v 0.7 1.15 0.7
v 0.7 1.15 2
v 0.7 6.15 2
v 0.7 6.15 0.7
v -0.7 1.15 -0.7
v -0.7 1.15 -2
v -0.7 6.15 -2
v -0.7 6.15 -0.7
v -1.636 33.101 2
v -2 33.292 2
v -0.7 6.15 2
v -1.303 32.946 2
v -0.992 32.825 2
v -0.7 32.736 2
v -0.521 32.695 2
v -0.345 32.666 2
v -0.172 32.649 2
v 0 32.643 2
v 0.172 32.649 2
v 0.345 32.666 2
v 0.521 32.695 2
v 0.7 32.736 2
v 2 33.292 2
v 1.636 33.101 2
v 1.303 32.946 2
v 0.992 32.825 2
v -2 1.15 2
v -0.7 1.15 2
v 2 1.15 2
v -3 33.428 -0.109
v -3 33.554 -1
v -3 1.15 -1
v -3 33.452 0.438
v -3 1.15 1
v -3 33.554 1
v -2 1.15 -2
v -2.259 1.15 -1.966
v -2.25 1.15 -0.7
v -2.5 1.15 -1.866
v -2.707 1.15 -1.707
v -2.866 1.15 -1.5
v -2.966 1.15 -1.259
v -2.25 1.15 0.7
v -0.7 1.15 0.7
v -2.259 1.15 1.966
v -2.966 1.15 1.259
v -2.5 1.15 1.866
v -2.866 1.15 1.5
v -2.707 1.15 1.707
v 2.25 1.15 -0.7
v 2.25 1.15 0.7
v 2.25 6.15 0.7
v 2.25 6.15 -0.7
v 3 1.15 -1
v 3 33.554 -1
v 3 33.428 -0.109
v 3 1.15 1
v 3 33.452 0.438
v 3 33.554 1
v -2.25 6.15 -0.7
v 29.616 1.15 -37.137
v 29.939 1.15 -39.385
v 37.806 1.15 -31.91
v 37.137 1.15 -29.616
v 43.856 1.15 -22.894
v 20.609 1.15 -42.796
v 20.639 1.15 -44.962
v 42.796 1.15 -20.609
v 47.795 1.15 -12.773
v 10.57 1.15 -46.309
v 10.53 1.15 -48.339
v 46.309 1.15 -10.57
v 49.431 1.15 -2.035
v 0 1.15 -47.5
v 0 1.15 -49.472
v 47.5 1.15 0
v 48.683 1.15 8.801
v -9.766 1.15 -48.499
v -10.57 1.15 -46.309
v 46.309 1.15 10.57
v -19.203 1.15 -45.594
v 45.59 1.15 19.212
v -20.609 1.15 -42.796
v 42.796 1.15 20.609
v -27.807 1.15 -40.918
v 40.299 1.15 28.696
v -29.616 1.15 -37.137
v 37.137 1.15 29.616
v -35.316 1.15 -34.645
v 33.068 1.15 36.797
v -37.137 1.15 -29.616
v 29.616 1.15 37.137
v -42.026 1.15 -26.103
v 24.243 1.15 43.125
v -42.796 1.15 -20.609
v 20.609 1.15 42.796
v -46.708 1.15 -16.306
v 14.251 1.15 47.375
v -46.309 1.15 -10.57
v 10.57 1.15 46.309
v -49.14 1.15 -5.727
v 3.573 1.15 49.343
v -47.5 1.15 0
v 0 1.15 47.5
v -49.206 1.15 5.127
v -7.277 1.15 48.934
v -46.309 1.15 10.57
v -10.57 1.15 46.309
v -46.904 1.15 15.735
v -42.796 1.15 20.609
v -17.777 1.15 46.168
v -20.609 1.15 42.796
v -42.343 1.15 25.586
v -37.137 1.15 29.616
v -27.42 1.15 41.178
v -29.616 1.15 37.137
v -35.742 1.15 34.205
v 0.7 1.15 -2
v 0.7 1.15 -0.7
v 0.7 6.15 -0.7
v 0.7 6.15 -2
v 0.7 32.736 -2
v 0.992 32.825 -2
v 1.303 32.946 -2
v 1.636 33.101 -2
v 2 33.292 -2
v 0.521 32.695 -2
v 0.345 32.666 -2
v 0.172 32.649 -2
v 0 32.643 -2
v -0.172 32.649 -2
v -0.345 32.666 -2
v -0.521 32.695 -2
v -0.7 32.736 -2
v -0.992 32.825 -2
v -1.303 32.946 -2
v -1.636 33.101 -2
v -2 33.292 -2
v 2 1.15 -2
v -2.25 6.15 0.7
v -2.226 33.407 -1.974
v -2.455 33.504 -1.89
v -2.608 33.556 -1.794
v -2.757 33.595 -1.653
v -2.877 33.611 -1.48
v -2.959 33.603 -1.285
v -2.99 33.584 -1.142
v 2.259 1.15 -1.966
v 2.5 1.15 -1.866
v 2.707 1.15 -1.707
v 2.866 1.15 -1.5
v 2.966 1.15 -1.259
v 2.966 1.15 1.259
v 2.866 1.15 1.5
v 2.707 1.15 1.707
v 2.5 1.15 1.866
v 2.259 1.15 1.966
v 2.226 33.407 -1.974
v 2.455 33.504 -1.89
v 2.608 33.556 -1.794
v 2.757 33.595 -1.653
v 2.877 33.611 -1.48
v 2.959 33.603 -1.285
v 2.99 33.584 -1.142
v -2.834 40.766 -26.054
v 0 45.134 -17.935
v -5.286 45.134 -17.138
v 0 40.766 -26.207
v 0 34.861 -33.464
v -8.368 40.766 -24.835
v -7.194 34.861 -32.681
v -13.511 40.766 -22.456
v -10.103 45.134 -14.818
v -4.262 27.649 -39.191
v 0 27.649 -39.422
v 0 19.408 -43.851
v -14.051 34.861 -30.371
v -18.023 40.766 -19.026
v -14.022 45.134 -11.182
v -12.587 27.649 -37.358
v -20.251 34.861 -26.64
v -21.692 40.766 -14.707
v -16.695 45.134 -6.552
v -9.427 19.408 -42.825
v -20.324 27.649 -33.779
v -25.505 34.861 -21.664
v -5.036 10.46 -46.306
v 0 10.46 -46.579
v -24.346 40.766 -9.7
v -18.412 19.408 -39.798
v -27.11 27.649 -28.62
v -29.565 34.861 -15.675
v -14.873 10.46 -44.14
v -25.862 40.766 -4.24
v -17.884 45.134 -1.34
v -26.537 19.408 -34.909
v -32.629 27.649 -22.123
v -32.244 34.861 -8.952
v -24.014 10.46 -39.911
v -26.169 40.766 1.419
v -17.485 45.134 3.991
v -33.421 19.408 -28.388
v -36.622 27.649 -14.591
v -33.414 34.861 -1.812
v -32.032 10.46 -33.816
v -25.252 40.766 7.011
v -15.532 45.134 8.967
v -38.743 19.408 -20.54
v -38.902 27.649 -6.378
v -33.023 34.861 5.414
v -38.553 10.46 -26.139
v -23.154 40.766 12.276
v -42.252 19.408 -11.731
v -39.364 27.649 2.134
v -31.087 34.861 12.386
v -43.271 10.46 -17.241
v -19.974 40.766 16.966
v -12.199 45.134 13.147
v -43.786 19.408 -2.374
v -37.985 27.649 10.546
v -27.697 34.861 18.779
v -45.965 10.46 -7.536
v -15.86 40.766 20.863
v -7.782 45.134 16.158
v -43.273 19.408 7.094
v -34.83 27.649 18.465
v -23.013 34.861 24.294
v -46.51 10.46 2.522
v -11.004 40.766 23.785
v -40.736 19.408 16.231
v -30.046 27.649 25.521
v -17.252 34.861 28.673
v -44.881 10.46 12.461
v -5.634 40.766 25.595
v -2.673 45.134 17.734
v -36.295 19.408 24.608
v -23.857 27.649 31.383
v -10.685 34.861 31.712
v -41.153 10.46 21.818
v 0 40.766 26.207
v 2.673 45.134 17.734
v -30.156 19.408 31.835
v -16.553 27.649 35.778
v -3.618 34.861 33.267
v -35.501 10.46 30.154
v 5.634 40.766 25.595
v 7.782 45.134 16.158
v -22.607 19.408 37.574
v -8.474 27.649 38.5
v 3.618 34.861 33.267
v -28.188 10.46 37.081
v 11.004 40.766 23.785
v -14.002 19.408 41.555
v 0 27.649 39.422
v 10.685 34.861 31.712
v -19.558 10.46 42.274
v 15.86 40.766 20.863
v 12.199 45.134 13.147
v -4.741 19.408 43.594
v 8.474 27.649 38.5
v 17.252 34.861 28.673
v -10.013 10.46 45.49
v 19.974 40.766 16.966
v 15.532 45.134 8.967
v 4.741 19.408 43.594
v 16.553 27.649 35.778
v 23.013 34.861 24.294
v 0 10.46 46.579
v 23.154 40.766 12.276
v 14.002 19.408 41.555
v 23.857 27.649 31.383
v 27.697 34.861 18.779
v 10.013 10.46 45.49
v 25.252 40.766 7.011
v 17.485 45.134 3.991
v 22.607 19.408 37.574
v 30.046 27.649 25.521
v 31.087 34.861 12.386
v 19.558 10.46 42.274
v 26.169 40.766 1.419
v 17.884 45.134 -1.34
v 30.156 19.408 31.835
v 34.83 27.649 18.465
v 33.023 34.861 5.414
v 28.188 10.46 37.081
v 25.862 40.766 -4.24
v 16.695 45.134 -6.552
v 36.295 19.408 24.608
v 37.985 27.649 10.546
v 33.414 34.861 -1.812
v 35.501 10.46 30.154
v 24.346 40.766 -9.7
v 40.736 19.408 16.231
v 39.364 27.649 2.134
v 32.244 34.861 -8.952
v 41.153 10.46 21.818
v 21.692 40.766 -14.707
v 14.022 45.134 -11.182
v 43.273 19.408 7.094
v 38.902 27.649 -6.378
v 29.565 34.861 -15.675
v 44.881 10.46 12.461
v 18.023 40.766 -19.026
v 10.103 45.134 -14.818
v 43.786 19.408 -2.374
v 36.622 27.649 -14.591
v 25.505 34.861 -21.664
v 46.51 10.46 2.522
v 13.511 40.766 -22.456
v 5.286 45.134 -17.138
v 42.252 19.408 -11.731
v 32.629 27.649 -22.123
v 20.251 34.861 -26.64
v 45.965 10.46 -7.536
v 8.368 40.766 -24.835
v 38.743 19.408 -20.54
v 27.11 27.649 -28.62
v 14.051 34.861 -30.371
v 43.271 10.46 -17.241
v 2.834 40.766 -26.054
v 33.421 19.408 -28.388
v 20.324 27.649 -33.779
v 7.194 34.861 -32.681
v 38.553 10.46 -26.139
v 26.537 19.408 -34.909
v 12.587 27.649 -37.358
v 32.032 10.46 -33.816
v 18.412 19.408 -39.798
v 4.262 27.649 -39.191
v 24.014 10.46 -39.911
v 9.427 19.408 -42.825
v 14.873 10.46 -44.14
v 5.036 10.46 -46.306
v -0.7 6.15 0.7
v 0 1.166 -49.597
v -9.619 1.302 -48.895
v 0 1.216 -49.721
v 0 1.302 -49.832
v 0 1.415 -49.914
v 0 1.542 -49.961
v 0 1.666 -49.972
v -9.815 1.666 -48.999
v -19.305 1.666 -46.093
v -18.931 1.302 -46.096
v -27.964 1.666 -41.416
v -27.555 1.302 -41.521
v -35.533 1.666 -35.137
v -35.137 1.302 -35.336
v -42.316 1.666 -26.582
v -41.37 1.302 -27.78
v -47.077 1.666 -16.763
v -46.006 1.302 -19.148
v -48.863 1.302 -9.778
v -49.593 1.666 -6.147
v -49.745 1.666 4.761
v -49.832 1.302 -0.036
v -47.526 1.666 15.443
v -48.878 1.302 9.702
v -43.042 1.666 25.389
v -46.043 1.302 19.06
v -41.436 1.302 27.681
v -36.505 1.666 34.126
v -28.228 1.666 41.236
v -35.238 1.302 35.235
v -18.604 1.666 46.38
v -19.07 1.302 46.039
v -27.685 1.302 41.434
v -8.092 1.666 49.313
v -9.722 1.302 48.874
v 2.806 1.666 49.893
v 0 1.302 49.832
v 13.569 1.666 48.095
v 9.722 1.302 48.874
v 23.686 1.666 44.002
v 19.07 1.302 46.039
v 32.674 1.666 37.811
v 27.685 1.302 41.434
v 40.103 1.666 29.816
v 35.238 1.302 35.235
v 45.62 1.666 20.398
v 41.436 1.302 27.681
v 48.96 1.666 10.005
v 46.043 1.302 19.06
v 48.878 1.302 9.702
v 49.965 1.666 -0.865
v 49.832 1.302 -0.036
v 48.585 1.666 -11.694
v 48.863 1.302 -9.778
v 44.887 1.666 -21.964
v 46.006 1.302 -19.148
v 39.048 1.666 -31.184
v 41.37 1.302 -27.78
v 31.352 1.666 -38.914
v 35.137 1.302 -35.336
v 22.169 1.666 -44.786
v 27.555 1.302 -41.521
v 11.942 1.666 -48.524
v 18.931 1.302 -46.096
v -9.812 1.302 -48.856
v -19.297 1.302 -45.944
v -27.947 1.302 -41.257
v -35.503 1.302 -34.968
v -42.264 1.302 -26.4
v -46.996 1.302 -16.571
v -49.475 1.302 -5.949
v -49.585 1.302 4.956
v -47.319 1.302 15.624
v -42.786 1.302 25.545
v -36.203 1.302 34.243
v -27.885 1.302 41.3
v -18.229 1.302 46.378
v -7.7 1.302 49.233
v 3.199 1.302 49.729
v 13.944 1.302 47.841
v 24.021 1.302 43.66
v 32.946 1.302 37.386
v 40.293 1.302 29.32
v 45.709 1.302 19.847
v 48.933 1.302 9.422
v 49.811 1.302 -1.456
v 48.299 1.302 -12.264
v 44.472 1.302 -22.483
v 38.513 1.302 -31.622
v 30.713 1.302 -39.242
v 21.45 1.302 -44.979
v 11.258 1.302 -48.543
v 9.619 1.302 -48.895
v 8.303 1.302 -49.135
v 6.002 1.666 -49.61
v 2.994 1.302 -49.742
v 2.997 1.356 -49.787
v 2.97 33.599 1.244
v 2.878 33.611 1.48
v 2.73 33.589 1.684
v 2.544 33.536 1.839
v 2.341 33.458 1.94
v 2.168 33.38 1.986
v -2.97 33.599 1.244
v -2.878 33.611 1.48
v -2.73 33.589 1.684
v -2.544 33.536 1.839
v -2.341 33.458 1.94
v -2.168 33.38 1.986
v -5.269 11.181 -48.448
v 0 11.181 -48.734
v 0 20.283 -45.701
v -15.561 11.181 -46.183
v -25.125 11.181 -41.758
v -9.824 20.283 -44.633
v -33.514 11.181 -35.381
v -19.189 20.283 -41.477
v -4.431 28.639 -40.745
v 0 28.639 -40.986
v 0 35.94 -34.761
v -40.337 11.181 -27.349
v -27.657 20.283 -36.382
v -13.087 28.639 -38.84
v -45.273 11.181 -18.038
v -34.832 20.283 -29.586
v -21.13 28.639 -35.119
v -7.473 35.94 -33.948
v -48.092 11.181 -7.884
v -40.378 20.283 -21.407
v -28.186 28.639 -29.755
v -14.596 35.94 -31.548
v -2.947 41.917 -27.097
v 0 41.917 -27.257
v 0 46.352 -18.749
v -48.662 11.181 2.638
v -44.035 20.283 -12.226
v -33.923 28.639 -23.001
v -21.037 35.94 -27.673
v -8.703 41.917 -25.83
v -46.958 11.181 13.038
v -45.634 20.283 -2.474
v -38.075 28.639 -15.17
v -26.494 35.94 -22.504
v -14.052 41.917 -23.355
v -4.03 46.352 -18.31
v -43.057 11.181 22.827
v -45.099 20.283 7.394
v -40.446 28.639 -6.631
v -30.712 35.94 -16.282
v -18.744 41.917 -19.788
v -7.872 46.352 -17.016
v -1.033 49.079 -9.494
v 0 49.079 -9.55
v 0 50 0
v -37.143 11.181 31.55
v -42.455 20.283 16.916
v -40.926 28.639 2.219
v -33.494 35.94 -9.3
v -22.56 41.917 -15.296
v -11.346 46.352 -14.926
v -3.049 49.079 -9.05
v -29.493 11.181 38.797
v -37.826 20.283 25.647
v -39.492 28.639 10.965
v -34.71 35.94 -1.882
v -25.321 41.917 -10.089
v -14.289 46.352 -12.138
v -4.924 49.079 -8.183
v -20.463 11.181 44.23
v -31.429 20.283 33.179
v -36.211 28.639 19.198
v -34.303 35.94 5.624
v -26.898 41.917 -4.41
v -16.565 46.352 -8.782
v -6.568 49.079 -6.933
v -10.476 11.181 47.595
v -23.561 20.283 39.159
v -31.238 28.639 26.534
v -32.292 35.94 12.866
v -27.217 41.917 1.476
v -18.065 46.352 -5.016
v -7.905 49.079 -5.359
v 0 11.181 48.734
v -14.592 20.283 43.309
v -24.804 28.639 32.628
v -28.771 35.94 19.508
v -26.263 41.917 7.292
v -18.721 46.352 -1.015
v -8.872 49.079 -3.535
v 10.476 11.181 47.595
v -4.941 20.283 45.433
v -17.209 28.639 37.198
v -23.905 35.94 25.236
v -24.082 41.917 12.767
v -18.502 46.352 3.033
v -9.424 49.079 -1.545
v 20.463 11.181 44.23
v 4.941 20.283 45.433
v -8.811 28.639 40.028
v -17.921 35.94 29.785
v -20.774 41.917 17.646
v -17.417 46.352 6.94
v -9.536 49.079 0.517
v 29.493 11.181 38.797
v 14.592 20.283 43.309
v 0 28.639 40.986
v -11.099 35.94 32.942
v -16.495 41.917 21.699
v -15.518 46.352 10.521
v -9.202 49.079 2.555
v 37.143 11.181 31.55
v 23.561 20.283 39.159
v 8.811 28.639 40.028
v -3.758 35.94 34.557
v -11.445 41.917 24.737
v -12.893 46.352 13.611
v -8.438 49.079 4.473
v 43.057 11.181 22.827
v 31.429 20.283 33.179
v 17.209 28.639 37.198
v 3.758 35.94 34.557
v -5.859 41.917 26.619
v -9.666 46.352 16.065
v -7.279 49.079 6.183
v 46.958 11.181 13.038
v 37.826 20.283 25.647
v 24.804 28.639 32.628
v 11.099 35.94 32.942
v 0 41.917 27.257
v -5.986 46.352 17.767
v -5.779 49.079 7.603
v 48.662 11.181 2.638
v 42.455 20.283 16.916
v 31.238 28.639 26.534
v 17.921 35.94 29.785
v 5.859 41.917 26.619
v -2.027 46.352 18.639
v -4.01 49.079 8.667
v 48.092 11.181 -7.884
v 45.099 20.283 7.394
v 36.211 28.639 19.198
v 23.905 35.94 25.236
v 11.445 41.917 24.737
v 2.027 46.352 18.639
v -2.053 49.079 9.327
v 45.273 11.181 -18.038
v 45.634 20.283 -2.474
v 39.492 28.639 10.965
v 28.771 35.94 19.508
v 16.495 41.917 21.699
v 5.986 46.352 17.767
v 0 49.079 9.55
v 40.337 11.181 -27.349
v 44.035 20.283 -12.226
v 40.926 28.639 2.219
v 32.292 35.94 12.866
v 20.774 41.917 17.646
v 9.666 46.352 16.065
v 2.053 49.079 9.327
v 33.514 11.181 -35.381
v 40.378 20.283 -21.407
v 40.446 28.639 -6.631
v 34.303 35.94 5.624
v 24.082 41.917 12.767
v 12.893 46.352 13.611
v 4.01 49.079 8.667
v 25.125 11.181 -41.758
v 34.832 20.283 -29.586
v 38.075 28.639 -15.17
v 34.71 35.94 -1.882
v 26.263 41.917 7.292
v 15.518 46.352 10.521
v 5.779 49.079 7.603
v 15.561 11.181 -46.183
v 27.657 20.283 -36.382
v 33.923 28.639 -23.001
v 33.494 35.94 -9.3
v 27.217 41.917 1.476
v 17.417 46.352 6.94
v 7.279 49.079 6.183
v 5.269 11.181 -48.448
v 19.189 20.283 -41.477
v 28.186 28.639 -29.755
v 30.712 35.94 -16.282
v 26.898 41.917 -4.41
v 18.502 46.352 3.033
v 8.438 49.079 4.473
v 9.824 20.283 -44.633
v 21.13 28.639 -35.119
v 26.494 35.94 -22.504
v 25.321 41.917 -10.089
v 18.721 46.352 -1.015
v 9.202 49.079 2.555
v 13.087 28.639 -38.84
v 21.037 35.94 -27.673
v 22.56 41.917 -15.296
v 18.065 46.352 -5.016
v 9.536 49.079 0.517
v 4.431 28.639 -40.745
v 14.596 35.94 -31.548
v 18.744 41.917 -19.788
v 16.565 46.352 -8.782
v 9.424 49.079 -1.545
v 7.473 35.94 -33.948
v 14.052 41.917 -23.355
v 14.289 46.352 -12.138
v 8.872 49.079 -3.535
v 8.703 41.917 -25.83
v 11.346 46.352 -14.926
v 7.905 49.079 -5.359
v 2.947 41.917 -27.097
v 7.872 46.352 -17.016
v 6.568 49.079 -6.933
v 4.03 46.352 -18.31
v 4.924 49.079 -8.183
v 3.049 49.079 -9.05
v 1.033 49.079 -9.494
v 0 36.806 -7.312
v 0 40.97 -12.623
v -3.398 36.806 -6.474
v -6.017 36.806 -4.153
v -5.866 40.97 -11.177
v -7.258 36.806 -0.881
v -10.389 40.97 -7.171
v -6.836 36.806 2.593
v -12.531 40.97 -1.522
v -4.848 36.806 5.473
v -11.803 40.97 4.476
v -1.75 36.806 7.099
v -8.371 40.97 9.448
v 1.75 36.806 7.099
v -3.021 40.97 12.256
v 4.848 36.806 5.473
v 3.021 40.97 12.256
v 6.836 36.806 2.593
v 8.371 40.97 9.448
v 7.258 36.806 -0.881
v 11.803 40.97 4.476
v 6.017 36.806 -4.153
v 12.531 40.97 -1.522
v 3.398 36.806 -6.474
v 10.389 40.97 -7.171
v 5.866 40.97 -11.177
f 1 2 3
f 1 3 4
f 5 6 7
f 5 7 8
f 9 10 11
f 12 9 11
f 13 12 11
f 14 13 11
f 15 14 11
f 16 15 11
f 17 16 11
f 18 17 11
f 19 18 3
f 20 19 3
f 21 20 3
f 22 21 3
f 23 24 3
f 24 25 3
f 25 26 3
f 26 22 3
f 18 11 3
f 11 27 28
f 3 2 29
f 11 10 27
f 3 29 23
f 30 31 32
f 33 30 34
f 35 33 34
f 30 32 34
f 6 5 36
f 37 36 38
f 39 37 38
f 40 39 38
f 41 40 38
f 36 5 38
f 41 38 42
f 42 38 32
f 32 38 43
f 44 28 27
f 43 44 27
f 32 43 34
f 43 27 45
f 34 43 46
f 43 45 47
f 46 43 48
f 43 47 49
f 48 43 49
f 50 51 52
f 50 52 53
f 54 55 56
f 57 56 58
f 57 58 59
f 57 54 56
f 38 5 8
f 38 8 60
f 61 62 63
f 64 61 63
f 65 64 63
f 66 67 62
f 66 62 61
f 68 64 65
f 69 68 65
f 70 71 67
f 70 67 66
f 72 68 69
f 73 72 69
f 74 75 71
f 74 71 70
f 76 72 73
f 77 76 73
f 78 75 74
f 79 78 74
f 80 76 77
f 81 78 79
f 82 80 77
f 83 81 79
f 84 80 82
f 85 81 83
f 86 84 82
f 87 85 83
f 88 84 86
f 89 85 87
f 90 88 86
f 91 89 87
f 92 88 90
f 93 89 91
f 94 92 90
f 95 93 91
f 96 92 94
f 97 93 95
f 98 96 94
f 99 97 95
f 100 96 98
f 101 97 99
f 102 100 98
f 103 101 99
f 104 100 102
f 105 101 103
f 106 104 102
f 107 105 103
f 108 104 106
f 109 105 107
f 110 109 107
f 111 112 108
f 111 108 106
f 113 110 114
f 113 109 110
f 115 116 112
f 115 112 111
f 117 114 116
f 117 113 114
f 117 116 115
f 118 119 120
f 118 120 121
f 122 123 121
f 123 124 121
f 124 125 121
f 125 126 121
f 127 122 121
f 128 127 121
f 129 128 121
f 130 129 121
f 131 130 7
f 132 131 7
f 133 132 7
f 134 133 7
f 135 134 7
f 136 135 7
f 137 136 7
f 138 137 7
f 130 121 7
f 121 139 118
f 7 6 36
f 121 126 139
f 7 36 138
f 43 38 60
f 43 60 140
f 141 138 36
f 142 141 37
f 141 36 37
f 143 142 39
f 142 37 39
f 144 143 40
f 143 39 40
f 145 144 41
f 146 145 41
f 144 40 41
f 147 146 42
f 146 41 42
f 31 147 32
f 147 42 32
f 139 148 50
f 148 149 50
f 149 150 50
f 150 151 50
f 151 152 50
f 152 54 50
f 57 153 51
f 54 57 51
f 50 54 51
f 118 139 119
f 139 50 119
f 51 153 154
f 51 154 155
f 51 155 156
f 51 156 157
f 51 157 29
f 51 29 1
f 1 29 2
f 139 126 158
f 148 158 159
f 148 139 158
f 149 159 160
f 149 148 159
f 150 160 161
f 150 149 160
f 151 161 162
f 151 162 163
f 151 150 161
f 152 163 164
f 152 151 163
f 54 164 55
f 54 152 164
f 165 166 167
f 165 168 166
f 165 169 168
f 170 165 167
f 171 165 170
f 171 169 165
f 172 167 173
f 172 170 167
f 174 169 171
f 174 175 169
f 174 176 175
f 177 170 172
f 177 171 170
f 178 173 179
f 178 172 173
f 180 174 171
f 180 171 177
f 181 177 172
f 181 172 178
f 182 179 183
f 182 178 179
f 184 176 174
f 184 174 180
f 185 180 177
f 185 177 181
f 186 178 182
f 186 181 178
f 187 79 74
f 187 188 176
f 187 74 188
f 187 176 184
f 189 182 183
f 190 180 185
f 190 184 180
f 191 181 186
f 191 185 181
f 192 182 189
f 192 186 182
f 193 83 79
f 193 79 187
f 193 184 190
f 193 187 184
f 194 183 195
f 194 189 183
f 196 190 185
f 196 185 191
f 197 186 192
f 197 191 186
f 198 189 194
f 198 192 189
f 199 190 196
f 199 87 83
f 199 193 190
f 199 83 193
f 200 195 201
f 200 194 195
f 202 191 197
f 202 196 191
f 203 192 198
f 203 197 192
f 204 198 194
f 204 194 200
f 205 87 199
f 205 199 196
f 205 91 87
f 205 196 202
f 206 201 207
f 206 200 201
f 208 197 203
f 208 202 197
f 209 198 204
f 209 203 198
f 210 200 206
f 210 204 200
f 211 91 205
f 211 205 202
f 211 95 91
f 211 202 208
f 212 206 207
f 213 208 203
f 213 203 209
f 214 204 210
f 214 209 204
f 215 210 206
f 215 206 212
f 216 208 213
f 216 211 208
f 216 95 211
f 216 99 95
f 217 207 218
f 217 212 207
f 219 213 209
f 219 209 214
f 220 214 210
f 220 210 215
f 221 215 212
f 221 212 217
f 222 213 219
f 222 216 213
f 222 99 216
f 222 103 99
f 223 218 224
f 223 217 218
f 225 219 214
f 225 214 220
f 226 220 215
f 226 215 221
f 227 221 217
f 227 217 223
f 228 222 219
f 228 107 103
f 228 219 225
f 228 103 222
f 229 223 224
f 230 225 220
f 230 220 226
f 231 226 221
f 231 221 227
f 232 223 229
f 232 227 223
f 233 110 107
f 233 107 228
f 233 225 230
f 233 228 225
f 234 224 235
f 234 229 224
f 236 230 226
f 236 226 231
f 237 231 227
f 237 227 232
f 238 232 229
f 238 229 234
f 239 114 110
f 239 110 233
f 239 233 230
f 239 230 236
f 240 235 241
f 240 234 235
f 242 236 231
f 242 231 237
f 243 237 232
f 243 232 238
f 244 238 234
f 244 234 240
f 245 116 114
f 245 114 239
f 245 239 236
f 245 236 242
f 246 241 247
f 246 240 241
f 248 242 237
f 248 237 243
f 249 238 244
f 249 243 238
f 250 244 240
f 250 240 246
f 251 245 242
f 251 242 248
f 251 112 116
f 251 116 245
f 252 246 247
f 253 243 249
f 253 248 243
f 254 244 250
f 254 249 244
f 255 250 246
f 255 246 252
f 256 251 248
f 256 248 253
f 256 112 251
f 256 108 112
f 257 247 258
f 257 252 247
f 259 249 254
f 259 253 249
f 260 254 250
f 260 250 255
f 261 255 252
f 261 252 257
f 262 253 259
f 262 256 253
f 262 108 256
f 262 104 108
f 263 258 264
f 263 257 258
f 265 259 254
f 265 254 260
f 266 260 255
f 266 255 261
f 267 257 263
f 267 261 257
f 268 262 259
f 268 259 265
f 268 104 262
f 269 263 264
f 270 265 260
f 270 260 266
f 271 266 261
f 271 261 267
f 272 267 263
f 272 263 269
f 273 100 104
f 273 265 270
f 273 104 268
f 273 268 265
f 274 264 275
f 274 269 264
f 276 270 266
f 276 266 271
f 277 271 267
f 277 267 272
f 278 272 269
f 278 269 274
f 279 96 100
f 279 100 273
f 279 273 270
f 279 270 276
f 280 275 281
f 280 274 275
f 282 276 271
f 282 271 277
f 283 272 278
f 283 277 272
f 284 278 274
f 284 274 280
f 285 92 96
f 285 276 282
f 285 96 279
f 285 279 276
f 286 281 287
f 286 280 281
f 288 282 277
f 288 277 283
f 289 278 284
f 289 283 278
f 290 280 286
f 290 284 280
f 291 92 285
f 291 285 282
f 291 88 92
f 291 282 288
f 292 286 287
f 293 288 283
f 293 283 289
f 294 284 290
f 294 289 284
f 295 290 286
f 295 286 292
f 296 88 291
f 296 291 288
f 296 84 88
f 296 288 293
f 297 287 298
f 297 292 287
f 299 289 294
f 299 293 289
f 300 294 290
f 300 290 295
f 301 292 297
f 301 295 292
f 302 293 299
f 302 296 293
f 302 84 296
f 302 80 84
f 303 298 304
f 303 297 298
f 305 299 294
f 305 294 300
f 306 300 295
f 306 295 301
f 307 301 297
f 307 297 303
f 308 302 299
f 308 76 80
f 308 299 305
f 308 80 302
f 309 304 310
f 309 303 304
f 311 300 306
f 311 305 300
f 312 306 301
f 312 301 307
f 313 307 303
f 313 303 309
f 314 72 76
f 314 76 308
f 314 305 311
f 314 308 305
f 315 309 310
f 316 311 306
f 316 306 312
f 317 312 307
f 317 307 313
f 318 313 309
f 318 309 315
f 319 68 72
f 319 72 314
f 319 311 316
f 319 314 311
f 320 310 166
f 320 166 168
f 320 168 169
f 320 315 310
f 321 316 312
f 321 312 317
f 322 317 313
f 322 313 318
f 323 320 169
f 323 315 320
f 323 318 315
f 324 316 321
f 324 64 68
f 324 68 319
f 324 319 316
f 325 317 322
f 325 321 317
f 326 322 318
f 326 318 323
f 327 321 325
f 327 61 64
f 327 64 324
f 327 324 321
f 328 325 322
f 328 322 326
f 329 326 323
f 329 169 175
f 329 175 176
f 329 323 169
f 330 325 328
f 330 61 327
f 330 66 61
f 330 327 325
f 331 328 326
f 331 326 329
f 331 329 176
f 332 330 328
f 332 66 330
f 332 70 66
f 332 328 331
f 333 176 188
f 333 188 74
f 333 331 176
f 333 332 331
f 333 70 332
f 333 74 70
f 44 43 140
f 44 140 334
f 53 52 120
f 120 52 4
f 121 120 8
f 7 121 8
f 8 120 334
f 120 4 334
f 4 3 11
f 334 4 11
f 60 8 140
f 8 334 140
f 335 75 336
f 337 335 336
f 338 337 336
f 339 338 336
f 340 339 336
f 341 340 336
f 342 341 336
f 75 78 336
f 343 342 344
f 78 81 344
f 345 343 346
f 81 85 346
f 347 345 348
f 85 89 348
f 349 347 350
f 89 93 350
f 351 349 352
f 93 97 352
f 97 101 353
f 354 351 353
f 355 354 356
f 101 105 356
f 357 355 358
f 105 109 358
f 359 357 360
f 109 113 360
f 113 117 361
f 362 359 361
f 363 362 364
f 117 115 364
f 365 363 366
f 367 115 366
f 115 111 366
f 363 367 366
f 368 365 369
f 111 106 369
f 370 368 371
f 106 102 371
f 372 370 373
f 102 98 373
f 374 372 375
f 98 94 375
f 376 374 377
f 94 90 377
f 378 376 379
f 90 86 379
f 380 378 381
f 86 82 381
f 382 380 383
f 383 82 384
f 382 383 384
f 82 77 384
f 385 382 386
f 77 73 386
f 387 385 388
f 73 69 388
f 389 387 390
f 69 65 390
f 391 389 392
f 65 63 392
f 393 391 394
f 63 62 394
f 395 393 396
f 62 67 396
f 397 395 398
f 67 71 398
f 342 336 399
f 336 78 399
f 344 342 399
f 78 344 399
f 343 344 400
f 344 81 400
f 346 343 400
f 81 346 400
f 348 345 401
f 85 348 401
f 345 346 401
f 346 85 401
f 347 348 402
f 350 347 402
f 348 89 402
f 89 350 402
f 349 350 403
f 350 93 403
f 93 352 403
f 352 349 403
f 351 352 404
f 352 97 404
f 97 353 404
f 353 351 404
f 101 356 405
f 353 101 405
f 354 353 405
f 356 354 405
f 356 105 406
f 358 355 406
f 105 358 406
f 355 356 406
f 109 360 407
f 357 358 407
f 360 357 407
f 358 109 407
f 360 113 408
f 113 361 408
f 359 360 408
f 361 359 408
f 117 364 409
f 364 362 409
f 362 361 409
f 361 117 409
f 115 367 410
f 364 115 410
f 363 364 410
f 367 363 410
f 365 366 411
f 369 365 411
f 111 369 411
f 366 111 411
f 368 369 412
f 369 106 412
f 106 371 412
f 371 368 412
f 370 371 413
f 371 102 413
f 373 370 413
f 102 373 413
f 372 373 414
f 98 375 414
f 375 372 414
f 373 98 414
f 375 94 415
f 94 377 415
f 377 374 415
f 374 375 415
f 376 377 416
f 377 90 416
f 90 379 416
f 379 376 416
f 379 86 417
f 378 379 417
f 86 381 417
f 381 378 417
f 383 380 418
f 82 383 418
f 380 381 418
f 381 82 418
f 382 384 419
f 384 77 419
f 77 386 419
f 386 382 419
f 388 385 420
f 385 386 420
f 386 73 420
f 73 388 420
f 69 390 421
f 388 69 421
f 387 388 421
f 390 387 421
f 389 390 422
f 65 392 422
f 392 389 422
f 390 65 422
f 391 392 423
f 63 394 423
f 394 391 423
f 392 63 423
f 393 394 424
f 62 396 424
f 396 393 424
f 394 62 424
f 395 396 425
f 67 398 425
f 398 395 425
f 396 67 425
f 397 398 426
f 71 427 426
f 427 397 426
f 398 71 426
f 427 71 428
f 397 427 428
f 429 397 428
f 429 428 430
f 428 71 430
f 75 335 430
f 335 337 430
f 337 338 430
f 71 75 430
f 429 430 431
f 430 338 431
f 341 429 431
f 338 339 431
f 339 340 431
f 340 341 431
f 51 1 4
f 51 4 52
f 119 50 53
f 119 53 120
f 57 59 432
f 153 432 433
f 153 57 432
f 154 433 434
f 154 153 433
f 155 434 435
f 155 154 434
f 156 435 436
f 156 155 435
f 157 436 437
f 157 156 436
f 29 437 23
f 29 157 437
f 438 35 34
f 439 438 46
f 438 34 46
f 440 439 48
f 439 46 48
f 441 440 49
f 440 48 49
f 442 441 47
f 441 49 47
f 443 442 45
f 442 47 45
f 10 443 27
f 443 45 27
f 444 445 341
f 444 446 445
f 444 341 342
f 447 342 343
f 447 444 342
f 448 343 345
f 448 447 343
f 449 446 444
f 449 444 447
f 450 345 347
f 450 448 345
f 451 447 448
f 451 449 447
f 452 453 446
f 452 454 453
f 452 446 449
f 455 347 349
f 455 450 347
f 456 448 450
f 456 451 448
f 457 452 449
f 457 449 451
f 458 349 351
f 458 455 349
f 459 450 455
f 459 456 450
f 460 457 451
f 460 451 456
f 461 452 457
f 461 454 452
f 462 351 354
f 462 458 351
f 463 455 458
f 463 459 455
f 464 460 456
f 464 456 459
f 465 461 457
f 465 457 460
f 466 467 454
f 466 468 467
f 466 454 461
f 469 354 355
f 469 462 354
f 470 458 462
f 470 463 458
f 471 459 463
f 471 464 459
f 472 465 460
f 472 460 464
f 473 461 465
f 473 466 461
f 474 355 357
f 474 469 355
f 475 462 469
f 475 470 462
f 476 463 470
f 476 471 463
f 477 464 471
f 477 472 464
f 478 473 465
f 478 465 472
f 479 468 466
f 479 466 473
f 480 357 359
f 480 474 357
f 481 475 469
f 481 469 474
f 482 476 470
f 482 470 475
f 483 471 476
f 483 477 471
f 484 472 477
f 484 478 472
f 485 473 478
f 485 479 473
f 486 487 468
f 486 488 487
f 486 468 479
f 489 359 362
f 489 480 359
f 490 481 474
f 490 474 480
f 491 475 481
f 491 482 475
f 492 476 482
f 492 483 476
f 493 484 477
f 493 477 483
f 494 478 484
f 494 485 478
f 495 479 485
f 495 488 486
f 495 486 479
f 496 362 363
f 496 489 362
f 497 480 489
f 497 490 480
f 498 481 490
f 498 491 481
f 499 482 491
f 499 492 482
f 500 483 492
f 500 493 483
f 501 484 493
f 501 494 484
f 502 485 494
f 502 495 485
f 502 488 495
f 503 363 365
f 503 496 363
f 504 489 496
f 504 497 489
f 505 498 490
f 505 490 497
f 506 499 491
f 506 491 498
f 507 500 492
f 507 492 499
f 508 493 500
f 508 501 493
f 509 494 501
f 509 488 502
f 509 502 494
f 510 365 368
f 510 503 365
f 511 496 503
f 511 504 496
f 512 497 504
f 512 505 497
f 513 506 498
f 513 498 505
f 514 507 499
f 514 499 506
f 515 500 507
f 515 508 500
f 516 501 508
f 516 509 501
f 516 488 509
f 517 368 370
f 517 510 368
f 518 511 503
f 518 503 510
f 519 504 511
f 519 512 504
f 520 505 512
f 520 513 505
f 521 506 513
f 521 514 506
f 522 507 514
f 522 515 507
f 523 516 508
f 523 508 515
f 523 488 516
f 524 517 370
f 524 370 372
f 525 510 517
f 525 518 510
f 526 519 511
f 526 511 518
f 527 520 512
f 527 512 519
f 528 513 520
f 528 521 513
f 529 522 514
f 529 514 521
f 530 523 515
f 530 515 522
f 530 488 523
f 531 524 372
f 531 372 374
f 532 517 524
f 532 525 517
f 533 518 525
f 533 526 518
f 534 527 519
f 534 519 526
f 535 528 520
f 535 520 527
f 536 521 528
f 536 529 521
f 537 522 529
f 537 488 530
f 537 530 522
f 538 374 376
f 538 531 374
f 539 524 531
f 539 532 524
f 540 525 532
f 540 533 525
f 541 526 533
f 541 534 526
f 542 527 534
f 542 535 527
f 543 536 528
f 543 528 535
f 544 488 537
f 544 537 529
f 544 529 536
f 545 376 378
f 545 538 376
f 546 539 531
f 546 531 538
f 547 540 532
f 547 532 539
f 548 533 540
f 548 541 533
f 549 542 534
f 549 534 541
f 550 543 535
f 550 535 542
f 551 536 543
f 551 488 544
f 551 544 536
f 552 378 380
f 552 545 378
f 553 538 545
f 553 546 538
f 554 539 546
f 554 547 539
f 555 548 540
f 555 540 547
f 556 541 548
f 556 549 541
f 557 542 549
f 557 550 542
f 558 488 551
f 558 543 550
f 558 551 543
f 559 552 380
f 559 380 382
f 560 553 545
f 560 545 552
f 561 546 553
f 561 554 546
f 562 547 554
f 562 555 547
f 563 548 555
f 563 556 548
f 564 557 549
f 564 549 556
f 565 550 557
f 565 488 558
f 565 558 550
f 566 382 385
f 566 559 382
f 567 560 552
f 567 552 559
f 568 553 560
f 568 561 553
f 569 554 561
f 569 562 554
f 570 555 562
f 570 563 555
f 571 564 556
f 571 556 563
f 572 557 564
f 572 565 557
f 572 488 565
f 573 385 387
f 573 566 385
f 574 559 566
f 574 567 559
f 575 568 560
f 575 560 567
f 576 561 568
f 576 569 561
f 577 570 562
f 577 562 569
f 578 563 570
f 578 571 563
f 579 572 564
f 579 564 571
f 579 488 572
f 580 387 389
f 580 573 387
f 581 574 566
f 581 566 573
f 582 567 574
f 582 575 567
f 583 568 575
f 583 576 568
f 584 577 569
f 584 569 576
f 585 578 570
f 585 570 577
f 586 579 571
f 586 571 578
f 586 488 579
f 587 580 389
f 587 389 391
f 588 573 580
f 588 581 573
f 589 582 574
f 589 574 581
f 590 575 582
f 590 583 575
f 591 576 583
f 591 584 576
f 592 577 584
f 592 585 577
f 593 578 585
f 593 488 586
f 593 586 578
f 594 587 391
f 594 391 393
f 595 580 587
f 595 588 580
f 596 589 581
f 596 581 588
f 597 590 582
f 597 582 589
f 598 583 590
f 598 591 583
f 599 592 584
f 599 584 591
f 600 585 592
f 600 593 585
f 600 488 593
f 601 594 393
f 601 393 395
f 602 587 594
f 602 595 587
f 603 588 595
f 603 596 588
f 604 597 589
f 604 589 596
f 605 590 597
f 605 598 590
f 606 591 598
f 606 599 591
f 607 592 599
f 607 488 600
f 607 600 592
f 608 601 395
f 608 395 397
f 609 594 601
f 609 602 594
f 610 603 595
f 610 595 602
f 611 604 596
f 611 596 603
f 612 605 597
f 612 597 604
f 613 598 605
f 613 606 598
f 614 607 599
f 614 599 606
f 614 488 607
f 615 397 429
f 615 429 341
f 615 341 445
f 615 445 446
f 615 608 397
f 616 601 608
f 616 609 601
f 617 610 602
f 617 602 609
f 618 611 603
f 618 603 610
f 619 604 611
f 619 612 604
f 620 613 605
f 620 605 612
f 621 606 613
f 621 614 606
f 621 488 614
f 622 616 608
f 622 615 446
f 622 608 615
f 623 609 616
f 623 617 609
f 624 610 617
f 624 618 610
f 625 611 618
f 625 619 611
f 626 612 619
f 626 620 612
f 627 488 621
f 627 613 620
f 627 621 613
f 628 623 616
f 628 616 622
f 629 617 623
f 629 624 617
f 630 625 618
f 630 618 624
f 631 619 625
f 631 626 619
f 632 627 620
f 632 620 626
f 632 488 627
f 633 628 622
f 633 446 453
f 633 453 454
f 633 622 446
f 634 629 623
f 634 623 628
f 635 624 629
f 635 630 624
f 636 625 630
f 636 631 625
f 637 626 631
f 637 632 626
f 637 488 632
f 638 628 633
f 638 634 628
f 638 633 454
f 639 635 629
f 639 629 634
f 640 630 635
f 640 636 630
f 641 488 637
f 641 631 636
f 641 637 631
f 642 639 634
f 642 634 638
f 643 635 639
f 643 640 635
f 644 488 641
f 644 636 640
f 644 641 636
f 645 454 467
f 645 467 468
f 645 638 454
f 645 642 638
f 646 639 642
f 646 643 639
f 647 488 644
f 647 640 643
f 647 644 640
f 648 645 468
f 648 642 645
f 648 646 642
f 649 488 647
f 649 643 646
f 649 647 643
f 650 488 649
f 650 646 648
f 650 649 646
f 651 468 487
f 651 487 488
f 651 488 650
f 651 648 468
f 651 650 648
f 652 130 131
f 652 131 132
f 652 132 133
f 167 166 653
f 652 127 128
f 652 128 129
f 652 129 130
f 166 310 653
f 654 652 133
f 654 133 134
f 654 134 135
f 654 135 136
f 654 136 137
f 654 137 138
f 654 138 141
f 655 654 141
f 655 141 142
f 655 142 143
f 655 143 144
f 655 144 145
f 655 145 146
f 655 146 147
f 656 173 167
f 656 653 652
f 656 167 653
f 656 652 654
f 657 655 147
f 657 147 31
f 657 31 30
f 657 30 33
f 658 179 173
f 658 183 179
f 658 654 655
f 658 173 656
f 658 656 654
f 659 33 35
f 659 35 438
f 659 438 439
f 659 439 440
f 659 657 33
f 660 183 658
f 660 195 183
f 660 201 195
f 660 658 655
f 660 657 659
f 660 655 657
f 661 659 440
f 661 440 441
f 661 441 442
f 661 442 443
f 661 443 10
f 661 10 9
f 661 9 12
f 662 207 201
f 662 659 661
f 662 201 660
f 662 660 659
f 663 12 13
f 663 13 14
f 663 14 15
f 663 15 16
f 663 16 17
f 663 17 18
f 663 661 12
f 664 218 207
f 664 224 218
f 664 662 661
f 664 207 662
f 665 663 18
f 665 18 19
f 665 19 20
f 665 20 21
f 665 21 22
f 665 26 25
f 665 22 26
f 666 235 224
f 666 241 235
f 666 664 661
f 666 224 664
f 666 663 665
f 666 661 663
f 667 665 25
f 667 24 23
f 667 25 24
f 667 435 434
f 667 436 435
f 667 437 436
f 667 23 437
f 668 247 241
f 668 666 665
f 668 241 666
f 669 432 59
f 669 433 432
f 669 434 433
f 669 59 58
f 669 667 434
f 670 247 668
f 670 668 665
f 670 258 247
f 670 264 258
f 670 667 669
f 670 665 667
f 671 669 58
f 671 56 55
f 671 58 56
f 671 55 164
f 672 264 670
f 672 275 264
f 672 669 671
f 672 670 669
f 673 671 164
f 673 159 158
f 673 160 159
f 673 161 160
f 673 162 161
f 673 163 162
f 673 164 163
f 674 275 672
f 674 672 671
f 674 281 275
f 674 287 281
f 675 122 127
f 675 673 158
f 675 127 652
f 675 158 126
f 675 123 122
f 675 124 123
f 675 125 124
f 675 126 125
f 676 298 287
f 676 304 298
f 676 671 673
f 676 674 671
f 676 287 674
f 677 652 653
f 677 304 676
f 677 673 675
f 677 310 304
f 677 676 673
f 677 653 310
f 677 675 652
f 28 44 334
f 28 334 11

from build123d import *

# Parameters (mm, degrees)
VERRUNDUNG3_R                   = 0.5
AUFSATZ_LINEAR_AUSTRAGEN3_REACH = 87.912
SCHNITT_LINEAR_AUSTRAGEN1_DEPTH = 5


with BuildPart() as part:
    # Skizze1 → Rotation1 (revolve)
    with BuildSketch(Plane(origin=(0, 0, 0), x_dir=(0, 0, -1), z_dir=(1, 0, 0))):
        with BuildLine():
            Line((0, 50), (0, 31.074955095))
            Line((0, 31.074955095), (17.934534763, 45.133942714))
            ThreePointArc((17.934534763, 45.133942714), (39.421697079, 27.648502112), (47.5, 1.149826685))
            Line((47.5, 1.149826685), (49.986777238, 1.149826685))
            ThreePointArc((49.986777238, 1.149826685), (34.946449503, 35.759553509), (0, 50))
        make_face()
    revolve(axis=Axis((0, -10000, 0), (0, 1, 0)))

    # Verrundung3
    verrundung3_edges = [part.edges().sort_by_distance(p)[0] for p in [
        (0, 1.149826685, 49.986777238),
    ]]
    fillet(verrundung3_edges, radius=VERRUNDUNG3_R)

    # Aufsatz-Linear austragen3: up to this cone (the profile starts outside it)
    aufsatz_linear_austragen3_end = Plane(origin=(0, 1.149827, 0), z_dir=(0, 1, 0)).offset(29.925129095) * Cone(1.276e-06, 74.609556944, 58.486870905, align=(Align.CENTER, Align.CENTER, Align.MIN), mode=Mode.PRIVATE)
    # Skizze3 → Aufsatz-Linear austragen3 (add, up to the surface)
    with BuildSketch(Plane.XZ.offset(-1.149826685), mode=Mode.PRIVATE) as aufsatz_linear_austragen3_sk1:
        with BuildLine():
            ThreePointArc((-3, 1), (-2.707106781, 1.707106781), (-2, 2))
            Line((-2, 2), (-0.7, 2))
            Line((-0.7, 2), (-0.7, 0.7))
            Line((-0.7, 0.7), (-2.25, 0.7))
            Line((-2.25, 0.7), (-2.25, -0.7))
            Line((-2.25, -0.7), (-0.7, -0.7))
            Line((-0.7, -0.7), (-0.7, -2))
            Line((-0.7, -2), (-2, -2))
            ThreePointArc((-2, -2), (-2.707106781, -1.707106781), (-3, -1))
            Line((-3, -1), (-3, 1))
        make_face()
    aufsatz_linear_austragen3_tool1 = extrude(aufsatz_linear_austragen3_sk1.sketch, amount=-AUFSATZ_LINEAR_AUSTRAGEN3_REACH, mode=Mode.PRIVATE) - aufsatz_linear_austragen3_end
    add(aufsatz_linear_austragen3_tool1.solids().sort_by_distance((-2.953859, 1.149827, 0))[0])
    # Skizze3 → Aufsatz-Linear austragen3 (add, up to the surface)
    with BuildSketch(Plane.XZ.offset(-1.149826685), mode=Mode.PRIVATE) as aufsatz_linear_austragen3_sk2:
        with BuildLine():
            Line((0.7, -2), (2, -2))
            ThreePointArc((2, -2), (2.707106781, -1.707106781), (3, -1))
            Line((3, -1), (3, 1))
            ThreePointArc((3, 1), (2.707106781, 1.707106781), (2, 2))
            Line((2, 2), (0.7, 2))
            Line((0.7, 2), (0.7, 0.7))
            Line((0.7, 0.7), (2.25, 0.7))
            Line((2.25, 0.7), (2.25, -0.7))
            Line((2.25, -0.7), (0.7, -0.7))
            Line((0.7, -0.7), (0.7, -2))
        make_face()
    aufsatz_linear_austragen3_tool2 = extrude(aufsatz_linear_austragen3_sk2.sketch, amount=-AUFSATZ_LINEAR_AUSTRAGEN3_REACH, mode=Mode.PRIVATE) - aufsatz_linear_austragen3_end
    add(aufsatz_linear_austragen3_tool2.solids().sort_by_distance((1.35, 1.149827, -1.953859))[0])
    # Skizze3 → Aufsatz-Linear austragen3 (add, up to the surface)
    with BuildSketch(Plane.XZ.offset(-1.149826685), mode=Mode.PRIVATE) as aufsatz_linear_austragen3_sk3:
        Polygon((0.7, 0.7), (2.25, 0.7), (2.25, -0.7), (0.7, -0.7), (0.7, -2), (-0.7, -2), (-0.7, -0.7), (-2.25, -0.7), (-2.25, 0.7), (-0.7, 0.7), (-0.7, 2), (0.7, 2), align=None)
    aufsatz_linear_austragen3_tool3 = extrude(aufsatz_linear_austragen3_sk3.sketch, amount=-AUFSATZ_LINEAR_AUSTRAGEN3_REACH, mode=Mode.PRIVATE) - aufsatz_linear_austragen3_end
    add(aufsatz_linear_austragen3_tool3.solids().sort_by_distance((0, 1.149827, 0))[0])

    # Skizze3_4 → Schnitt-Linear austragen1 (cut)
    with BuildSketch(Plane.XZ.offset(-1.149826685)):
        Polygon((0.7, 0.7), (2.25, 0.7), (2.25, -0.7), (0.7, -0.7), (0.7, -2), (-0.7, -2), (-0.7, -0.7), (-2.25, -0.7), (-2.25, 0.7), (-0.7, 0.7), (-0.7, 2), (0.7, 2), align=None)
    extrude(amount=-SCHNITT_LINEAR_AUSTRAGEN1_DEPTH, mode=Mode.SUBTRACT)


solid = part.part
